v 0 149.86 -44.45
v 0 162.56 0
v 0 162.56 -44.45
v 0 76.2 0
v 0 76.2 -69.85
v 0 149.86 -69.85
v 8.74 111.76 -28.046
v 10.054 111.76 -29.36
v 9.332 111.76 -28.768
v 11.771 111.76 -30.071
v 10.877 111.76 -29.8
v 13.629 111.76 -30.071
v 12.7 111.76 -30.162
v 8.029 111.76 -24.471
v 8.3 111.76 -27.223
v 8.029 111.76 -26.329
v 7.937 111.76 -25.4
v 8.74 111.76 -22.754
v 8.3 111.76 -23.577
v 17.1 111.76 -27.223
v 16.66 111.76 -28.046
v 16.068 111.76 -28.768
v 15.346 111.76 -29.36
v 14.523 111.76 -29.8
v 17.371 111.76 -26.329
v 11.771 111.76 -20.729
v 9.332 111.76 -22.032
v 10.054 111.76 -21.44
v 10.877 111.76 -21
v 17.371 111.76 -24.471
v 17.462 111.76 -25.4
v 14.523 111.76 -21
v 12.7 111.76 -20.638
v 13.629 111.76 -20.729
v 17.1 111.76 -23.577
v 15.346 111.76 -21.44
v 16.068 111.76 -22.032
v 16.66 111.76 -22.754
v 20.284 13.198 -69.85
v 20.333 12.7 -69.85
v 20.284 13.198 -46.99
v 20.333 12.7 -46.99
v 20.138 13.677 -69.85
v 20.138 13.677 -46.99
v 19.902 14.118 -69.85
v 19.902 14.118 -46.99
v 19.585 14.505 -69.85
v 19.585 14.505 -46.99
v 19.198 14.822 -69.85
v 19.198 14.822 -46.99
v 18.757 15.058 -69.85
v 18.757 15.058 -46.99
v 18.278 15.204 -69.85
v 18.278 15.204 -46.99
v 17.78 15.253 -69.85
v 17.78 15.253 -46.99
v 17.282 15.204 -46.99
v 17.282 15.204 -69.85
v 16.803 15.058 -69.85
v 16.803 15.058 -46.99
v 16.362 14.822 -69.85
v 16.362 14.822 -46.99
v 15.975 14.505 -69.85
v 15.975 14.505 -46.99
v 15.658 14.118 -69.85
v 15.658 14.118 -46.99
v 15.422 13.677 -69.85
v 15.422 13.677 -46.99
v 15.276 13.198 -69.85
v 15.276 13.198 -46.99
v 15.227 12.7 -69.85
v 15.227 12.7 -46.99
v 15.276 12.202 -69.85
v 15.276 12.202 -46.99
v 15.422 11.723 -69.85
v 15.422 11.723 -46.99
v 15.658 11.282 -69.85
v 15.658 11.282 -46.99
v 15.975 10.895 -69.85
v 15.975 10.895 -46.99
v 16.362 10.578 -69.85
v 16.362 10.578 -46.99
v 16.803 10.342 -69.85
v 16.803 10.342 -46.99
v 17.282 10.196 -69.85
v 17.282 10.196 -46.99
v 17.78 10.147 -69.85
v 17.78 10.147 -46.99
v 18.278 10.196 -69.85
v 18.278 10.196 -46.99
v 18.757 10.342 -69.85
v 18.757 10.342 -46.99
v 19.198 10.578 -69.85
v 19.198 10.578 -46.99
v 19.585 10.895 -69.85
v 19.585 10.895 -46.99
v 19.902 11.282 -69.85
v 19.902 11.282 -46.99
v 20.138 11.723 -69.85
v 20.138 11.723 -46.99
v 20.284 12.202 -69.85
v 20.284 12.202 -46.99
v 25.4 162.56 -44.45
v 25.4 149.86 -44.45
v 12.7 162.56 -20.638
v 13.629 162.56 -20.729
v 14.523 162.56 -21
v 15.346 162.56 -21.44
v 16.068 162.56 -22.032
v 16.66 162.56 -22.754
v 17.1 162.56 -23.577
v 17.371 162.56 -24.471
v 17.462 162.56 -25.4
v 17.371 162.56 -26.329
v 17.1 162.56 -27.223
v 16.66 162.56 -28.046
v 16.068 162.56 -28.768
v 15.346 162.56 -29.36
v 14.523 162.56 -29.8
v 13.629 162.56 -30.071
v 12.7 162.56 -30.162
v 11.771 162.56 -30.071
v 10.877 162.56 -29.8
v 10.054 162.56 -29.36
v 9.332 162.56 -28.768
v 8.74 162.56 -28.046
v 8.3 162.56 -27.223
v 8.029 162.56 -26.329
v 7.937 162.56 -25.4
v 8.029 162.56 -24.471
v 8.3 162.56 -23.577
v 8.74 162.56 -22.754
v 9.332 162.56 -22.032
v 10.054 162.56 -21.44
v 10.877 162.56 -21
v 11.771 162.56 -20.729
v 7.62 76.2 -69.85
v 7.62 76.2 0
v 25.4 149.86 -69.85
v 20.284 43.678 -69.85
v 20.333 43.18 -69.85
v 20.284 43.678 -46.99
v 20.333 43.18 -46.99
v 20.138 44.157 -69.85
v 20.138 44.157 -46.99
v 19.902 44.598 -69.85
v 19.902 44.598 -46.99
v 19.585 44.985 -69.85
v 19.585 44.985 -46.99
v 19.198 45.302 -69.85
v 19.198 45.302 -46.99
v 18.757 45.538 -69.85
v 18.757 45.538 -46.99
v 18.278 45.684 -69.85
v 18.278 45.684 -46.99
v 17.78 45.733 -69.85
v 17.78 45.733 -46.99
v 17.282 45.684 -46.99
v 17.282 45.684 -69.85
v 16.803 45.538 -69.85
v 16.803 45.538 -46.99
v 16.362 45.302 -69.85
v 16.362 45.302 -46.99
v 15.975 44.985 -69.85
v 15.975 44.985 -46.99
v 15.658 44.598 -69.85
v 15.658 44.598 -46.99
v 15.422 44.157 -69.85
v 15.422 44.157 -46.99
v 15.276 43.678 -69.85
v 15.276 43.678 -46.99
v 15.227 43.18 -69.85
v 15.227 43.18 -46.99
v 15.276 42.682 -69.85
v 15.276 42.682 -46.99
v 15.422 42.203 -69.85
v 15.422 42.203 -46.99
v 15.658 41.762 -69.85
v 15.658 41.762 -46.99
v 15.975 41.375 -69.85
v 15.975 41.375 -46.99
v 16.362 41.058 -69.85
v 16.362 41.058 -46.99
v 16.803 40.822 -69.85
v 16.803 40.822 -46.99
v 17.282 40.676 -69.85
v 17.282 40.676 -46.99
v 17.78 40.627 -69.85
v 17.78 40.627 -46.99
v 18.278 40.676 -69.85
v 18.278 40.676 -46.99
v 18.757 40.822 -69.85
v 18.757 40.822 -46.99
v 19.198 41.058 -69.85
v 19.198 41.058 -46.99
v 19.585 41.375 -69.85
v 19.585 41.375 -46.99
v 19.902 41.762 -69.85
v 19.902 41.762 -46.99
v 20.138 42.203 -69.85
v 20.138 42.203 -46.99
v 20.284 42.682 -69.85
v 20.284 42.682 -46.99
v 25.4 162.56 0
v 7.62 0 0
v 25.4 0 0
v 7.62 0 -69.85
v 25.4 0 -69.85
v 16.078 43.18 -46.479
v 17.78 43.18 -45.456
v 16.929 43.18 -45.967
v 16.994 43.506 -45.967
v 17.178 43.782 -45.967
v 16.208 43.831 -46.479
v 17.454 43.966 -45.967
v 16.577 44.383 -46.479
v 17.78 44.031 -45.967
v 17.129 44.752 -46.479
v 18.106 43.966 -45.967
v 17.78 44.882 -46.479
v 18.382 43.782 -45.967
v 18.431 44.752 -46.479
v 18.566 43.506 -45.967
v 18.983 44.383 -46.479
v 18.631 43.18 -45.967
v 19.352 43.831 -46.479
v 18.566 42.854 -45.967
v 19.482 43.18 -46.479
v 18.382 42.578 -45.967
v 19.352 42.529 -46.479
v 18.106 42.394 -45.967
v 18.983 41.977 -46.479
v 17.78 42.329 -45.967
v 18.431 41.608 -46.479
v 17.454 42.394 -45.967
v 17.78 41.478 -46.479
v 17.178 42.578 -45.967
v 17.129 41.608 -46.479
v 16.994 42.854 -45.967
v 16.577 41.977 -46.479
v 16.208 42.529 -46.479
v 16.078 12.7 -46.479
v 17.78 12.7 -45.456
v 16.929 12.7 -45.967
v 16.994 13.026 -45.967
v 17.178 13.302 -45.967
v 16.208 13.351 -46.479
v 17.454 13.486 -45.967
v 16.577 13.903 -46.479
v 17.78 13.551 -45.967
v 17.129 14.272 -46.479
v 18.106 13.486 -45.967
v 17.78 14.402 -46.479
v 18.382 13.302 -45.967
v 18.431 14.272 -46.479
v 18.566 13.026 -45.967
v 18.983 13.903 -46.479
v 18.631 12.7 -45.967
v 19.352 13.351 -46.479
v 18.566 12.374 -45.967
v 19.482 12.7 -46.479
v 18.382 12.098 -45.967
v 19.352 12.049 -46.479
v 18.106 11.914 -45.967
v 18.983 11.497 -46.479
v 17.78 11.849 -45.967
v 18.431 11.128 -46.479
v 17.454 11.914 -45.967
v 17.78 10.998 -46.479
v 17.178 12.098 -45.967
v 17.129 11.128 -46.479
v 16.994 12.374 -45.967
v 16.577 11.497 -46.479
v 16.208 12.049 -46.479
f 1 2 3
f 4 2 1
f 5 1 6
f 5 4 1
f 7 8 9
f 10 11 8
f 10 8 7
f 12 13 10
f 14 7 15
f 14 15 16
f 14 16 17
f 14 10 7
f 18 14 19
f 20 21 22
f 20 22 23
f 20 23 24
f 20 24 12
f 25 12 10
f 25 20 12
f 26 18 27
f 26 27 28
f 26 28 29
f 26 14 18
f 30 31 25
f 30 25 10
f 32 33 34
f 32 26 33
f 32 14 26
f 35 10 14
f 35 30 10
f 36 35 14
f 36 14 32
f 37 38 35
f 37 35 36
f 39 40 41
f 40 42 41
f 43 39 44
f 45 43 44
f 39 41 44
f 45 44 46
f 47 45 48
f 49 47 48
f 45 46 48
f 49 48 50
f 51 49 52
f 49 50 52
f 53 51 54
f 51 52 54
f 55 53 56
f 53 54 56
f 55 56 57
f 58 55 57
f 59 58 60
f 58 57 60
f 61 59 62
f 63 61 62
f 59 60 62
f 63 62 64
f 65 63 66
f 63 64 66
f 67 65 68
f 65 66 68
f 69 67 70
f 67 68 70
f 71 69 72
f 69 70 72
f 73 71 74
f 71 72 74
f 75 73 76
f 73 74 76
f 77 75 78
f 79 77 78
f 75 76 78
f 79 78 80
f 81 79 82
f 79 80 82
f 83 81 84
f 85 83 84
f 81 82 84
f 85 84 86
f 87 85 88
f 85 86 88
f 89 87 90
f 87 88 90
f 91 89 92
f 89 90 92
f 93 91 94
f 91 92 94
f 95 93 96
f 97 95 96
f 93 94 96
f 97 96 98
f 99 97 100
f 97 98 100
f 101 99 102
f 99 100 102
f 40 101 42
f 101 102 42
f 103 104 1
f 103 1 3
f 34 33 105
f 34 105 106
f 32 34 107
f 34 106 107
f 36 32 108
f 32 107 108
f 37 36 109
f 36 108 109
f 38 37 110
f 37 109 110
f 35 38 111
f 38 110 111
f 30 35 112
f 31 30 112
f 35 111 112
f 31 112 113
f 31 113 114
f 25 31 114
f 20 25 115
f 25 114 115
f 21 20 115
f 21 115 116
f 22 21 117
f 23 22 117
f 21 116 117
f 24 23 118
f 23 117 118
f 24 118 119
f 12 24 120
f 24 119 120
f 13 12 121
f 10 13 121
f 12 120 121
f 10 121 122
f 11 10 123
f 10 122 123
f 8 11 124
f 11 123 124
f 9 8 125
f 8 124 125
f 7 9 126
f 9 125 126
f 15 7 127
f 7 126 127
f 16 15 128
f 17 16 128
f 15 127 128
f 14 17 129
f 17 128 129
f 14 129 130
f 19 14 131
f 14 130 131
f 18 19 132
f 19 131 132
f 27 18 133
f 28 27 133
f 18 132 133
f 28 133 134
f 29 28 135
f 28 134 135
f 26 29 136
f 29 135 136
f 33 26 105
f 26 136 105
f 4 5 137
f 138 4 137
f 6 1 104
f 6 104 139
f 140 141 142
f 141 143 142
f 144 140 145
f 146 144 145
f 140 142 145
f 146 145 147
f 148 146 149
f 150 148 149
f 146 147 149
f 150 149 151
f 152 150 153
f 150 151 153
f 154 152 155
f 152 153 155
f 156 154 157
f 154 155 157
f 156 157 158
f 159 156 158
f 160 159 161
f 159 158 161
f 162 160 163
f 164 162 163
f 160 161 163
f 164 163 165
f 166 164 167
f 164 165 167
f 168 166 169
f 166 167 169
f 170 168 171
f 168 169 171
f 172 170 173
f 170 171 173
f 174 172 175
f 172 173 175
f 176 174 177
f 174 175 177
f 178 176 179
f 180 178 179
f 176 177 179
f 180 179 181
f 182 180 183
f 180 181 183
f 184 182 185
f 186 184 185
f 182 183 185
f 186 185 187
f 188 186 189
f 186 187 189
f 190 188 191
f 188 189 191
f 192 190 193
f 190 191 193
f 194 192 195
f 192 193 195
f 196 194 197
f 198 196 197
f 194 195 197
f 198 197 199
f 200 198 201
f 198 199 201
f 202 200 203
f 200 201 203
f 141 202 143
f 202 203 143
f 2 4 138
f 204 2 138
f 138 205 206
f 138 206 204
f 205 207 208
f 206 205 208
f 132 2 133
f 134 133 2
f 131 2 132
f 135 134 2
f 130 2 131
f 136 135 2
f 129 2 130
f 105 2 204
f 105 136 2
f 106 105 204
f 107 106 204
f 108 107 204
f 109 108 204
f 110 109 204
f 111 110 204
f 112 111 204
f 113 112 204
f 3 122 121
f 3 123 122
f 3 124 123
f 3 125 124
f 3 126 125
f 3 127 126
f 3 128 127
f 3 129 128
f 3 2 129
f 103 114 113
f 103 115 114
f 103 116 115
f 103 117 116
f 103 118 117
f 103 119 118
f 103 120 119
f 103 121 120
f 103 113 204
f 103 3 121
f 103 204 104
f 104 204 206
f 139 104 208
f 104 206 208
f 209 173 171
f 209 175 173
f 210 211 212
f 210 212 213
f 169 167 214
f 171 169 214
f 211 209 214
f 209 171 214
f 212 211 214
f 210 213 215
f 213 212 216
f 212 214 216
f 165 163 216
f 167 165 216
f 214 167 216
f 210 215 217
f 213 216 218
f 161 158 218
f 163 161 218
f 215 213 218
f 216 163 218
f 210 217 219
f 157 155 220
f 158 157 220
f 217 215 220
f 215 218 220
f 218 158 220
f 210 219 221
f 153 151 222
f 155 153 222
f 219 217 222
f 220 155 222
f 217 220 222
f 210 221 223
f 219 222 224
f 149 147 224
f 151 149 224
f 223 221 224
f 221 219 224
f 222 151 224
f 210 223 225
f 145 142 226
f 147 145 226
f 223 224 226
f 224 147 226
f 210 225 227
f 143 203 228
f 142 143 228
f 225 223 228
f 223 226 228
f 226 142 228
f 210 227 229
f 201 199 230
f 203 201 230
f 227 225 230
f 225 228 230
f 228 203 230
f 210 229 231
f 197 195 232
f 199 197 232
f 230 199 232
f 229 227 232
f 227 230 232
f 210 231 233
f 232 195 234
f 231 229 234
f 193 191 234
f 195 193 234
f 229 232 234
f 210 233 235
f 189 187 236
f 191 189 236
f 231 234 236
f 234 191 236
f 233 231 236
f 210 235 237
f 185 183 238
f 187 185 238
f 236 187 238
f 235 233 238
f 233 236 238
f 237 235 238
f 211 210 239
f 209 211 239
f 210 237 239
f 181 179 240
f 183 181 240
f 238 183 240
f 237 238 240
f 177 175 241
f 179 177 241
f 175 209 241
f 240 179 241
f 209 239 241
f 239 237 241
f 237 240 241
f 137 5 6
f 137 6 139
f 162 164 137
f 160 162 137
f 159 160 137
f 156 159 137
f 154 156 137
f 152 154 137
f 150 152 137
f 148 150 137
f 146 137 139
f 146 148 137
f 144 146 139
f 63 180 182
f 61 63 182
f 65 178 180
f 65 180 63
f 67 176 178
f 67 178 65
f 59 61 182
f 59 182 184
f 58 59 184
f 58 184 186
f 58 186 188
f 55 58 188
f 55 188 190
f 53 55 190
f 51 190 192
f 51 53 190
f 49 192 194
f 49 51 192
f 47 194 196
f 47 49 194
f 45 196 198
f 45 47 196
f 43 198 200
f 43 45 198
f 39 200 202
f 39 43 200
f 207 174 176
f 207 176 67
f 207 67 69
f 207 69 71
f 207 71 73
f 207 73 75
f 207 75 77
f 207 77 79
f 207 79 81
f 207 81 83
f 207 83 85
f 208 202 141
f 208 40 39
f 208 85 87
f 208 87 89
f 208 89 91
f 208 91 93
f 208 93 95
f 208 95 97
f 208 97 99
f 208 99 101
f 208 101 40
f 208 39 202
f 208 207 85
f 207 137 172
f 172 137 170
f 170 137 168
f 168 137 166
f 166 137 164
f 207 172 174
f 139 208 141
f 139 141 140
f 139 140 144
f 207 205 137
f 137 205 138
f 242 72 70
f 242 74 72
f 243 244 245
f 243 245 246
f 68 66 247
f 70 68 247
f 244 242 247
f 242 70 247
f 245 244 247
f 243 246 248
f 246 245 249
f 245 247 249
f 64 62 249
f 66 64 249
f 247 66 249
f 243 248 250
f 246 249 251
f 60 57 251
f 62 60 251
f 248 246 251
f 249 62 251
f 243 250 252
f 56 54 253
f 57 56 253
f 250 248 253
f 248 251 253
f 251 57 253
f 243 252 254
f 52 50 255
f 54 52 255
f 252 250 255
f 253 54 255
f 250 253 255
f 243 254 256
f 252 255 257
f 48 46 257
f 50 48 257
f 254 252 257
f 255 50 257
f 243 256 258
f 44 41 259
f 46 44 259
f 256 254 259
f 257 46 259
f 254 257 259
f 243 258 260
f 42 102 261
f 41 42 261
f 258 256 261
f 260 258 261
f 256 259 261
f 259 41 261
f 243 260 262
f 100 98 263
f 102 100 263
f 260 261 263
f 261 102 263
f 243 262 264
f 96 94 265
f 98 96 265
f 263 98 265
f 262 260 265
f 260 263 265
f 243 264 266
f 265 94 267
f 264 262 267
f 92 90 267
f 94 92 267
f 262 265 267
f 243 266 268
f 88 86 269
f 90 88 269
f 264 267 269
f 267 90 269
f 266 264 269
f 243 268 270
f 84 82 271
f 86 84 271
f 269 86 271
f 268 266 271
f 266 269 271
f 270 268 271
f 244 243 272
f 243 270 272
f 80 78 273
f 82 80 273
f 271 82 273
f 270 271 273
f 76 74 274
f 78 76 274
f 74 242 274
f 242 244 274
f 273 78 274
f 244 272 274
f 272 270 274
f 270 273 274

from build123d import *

# Parameters (mm, degrees)
SKETCH1_W                   = 25.4
SKETCH1_H                   = 69.85
BOSS_EXTRUDE1_DEPTH         = 162.56
SKETCH2_R                   = 4.7625
CUT_EXTRUDE1_DEPTH          = 50.8
SKETCH3_W                   = 7.62
SKETCH3_H                   = 76.2
CUT_EXTRUDE2_DEPTH          = 179.745450571
SKETCH4_W                   = 25.4
SKETCH4_H                   = 12.7
CUT_EXTRUDE3_DEPTH          = 179.745450571
F_1_4_20_TAPPED_HOLE1_D     = 5.1054
F_1_4_20_TAPPED_HOLE1_DEPTH = 22.86
F_1_4_20_TAPPED_HOLE1_TIP   = 1.533816902


with BuildPart() as part:
    # Sketch1 → Boss-Extrude1 (new body)
    with BuildSketch(Plane(origin=(0, 0, 0), x_dir=(1, 0, 0), z_dir=(0, 1, 0))):
        with Locations((12.7, 34.925)):
            Rectangle(SKETCH1_W, SKETCH1_H)
    extrude(amount=BOSS_EXTRUDE1_DEPTH)

    # Sketch2 → Cut-Extrude1 (cut)
    with BuildSketch(Plane(origin=(0, 162.56, 0), x_dir=(1, 0, 0), z_dir=(0, 1, 0))):
        with Locations(Location((12.7, 25.4, 0), (0, 0, 270))):
            Circle(SKETCH2_R)
    extrude(amount=-CUT_EXTRUDE1_DEPTH, mode=Mode.SUBTRACT)

    # Sketch3 → Cut-Extrude2 (cut, through all)
    with BuildSketch(Plane.XY):
        with Locations((3.81, 38.1)):
            Rectangle(SKETCH3_W, SKETCH3_H)
    extrude(amount=-CUT_EXTRUDE2_DEPTH, mode=Mode.SUBTRACT)

    # Sketch4 → Cut-Extrude3 (cut, through all)
    with BuildSketch(Plane(origin=(25.4, 0, 0), x_dir=(0, 0, -1), z_dir=(1, 0, 0))):
        with Locations((57.15, 156.21)):
            Rectangle(SKETCH4_W, SKETCH4_H)
    extrude(amount=-CUT_EXTRUDE3_DEPTH, mode=Mode.SUBTRACT)

    # 1/4-20 Tapped Hole1
    with Locations(Plane(origin=(0, 0, -69.85), x_dir=(-1, 0, 0), z_dir=(0, 0, -1))):
        with Locations((-17.78, 43.18), (-17.78, 12.7)):
            Hole(F_1_4_20_TAPPED_HOLE1_D / 2, depth=F_1_4_20_TAPPED_HOLE1_DEPTH)
            with Locations((0, 0, -(F_1_4_20_TAPPED_HOLE1_DEPTH + F_1_4_20_TAPPED_HOLE1_TIP / 2))):  # 118° drill point
                Cone(0, F_1_4_20_TAPPED_HOLE1_D / 2, F_1_4_20_TAPPED_HOLE1_TIP, mode=Mode.SUBTRACT)


solid = part.part
